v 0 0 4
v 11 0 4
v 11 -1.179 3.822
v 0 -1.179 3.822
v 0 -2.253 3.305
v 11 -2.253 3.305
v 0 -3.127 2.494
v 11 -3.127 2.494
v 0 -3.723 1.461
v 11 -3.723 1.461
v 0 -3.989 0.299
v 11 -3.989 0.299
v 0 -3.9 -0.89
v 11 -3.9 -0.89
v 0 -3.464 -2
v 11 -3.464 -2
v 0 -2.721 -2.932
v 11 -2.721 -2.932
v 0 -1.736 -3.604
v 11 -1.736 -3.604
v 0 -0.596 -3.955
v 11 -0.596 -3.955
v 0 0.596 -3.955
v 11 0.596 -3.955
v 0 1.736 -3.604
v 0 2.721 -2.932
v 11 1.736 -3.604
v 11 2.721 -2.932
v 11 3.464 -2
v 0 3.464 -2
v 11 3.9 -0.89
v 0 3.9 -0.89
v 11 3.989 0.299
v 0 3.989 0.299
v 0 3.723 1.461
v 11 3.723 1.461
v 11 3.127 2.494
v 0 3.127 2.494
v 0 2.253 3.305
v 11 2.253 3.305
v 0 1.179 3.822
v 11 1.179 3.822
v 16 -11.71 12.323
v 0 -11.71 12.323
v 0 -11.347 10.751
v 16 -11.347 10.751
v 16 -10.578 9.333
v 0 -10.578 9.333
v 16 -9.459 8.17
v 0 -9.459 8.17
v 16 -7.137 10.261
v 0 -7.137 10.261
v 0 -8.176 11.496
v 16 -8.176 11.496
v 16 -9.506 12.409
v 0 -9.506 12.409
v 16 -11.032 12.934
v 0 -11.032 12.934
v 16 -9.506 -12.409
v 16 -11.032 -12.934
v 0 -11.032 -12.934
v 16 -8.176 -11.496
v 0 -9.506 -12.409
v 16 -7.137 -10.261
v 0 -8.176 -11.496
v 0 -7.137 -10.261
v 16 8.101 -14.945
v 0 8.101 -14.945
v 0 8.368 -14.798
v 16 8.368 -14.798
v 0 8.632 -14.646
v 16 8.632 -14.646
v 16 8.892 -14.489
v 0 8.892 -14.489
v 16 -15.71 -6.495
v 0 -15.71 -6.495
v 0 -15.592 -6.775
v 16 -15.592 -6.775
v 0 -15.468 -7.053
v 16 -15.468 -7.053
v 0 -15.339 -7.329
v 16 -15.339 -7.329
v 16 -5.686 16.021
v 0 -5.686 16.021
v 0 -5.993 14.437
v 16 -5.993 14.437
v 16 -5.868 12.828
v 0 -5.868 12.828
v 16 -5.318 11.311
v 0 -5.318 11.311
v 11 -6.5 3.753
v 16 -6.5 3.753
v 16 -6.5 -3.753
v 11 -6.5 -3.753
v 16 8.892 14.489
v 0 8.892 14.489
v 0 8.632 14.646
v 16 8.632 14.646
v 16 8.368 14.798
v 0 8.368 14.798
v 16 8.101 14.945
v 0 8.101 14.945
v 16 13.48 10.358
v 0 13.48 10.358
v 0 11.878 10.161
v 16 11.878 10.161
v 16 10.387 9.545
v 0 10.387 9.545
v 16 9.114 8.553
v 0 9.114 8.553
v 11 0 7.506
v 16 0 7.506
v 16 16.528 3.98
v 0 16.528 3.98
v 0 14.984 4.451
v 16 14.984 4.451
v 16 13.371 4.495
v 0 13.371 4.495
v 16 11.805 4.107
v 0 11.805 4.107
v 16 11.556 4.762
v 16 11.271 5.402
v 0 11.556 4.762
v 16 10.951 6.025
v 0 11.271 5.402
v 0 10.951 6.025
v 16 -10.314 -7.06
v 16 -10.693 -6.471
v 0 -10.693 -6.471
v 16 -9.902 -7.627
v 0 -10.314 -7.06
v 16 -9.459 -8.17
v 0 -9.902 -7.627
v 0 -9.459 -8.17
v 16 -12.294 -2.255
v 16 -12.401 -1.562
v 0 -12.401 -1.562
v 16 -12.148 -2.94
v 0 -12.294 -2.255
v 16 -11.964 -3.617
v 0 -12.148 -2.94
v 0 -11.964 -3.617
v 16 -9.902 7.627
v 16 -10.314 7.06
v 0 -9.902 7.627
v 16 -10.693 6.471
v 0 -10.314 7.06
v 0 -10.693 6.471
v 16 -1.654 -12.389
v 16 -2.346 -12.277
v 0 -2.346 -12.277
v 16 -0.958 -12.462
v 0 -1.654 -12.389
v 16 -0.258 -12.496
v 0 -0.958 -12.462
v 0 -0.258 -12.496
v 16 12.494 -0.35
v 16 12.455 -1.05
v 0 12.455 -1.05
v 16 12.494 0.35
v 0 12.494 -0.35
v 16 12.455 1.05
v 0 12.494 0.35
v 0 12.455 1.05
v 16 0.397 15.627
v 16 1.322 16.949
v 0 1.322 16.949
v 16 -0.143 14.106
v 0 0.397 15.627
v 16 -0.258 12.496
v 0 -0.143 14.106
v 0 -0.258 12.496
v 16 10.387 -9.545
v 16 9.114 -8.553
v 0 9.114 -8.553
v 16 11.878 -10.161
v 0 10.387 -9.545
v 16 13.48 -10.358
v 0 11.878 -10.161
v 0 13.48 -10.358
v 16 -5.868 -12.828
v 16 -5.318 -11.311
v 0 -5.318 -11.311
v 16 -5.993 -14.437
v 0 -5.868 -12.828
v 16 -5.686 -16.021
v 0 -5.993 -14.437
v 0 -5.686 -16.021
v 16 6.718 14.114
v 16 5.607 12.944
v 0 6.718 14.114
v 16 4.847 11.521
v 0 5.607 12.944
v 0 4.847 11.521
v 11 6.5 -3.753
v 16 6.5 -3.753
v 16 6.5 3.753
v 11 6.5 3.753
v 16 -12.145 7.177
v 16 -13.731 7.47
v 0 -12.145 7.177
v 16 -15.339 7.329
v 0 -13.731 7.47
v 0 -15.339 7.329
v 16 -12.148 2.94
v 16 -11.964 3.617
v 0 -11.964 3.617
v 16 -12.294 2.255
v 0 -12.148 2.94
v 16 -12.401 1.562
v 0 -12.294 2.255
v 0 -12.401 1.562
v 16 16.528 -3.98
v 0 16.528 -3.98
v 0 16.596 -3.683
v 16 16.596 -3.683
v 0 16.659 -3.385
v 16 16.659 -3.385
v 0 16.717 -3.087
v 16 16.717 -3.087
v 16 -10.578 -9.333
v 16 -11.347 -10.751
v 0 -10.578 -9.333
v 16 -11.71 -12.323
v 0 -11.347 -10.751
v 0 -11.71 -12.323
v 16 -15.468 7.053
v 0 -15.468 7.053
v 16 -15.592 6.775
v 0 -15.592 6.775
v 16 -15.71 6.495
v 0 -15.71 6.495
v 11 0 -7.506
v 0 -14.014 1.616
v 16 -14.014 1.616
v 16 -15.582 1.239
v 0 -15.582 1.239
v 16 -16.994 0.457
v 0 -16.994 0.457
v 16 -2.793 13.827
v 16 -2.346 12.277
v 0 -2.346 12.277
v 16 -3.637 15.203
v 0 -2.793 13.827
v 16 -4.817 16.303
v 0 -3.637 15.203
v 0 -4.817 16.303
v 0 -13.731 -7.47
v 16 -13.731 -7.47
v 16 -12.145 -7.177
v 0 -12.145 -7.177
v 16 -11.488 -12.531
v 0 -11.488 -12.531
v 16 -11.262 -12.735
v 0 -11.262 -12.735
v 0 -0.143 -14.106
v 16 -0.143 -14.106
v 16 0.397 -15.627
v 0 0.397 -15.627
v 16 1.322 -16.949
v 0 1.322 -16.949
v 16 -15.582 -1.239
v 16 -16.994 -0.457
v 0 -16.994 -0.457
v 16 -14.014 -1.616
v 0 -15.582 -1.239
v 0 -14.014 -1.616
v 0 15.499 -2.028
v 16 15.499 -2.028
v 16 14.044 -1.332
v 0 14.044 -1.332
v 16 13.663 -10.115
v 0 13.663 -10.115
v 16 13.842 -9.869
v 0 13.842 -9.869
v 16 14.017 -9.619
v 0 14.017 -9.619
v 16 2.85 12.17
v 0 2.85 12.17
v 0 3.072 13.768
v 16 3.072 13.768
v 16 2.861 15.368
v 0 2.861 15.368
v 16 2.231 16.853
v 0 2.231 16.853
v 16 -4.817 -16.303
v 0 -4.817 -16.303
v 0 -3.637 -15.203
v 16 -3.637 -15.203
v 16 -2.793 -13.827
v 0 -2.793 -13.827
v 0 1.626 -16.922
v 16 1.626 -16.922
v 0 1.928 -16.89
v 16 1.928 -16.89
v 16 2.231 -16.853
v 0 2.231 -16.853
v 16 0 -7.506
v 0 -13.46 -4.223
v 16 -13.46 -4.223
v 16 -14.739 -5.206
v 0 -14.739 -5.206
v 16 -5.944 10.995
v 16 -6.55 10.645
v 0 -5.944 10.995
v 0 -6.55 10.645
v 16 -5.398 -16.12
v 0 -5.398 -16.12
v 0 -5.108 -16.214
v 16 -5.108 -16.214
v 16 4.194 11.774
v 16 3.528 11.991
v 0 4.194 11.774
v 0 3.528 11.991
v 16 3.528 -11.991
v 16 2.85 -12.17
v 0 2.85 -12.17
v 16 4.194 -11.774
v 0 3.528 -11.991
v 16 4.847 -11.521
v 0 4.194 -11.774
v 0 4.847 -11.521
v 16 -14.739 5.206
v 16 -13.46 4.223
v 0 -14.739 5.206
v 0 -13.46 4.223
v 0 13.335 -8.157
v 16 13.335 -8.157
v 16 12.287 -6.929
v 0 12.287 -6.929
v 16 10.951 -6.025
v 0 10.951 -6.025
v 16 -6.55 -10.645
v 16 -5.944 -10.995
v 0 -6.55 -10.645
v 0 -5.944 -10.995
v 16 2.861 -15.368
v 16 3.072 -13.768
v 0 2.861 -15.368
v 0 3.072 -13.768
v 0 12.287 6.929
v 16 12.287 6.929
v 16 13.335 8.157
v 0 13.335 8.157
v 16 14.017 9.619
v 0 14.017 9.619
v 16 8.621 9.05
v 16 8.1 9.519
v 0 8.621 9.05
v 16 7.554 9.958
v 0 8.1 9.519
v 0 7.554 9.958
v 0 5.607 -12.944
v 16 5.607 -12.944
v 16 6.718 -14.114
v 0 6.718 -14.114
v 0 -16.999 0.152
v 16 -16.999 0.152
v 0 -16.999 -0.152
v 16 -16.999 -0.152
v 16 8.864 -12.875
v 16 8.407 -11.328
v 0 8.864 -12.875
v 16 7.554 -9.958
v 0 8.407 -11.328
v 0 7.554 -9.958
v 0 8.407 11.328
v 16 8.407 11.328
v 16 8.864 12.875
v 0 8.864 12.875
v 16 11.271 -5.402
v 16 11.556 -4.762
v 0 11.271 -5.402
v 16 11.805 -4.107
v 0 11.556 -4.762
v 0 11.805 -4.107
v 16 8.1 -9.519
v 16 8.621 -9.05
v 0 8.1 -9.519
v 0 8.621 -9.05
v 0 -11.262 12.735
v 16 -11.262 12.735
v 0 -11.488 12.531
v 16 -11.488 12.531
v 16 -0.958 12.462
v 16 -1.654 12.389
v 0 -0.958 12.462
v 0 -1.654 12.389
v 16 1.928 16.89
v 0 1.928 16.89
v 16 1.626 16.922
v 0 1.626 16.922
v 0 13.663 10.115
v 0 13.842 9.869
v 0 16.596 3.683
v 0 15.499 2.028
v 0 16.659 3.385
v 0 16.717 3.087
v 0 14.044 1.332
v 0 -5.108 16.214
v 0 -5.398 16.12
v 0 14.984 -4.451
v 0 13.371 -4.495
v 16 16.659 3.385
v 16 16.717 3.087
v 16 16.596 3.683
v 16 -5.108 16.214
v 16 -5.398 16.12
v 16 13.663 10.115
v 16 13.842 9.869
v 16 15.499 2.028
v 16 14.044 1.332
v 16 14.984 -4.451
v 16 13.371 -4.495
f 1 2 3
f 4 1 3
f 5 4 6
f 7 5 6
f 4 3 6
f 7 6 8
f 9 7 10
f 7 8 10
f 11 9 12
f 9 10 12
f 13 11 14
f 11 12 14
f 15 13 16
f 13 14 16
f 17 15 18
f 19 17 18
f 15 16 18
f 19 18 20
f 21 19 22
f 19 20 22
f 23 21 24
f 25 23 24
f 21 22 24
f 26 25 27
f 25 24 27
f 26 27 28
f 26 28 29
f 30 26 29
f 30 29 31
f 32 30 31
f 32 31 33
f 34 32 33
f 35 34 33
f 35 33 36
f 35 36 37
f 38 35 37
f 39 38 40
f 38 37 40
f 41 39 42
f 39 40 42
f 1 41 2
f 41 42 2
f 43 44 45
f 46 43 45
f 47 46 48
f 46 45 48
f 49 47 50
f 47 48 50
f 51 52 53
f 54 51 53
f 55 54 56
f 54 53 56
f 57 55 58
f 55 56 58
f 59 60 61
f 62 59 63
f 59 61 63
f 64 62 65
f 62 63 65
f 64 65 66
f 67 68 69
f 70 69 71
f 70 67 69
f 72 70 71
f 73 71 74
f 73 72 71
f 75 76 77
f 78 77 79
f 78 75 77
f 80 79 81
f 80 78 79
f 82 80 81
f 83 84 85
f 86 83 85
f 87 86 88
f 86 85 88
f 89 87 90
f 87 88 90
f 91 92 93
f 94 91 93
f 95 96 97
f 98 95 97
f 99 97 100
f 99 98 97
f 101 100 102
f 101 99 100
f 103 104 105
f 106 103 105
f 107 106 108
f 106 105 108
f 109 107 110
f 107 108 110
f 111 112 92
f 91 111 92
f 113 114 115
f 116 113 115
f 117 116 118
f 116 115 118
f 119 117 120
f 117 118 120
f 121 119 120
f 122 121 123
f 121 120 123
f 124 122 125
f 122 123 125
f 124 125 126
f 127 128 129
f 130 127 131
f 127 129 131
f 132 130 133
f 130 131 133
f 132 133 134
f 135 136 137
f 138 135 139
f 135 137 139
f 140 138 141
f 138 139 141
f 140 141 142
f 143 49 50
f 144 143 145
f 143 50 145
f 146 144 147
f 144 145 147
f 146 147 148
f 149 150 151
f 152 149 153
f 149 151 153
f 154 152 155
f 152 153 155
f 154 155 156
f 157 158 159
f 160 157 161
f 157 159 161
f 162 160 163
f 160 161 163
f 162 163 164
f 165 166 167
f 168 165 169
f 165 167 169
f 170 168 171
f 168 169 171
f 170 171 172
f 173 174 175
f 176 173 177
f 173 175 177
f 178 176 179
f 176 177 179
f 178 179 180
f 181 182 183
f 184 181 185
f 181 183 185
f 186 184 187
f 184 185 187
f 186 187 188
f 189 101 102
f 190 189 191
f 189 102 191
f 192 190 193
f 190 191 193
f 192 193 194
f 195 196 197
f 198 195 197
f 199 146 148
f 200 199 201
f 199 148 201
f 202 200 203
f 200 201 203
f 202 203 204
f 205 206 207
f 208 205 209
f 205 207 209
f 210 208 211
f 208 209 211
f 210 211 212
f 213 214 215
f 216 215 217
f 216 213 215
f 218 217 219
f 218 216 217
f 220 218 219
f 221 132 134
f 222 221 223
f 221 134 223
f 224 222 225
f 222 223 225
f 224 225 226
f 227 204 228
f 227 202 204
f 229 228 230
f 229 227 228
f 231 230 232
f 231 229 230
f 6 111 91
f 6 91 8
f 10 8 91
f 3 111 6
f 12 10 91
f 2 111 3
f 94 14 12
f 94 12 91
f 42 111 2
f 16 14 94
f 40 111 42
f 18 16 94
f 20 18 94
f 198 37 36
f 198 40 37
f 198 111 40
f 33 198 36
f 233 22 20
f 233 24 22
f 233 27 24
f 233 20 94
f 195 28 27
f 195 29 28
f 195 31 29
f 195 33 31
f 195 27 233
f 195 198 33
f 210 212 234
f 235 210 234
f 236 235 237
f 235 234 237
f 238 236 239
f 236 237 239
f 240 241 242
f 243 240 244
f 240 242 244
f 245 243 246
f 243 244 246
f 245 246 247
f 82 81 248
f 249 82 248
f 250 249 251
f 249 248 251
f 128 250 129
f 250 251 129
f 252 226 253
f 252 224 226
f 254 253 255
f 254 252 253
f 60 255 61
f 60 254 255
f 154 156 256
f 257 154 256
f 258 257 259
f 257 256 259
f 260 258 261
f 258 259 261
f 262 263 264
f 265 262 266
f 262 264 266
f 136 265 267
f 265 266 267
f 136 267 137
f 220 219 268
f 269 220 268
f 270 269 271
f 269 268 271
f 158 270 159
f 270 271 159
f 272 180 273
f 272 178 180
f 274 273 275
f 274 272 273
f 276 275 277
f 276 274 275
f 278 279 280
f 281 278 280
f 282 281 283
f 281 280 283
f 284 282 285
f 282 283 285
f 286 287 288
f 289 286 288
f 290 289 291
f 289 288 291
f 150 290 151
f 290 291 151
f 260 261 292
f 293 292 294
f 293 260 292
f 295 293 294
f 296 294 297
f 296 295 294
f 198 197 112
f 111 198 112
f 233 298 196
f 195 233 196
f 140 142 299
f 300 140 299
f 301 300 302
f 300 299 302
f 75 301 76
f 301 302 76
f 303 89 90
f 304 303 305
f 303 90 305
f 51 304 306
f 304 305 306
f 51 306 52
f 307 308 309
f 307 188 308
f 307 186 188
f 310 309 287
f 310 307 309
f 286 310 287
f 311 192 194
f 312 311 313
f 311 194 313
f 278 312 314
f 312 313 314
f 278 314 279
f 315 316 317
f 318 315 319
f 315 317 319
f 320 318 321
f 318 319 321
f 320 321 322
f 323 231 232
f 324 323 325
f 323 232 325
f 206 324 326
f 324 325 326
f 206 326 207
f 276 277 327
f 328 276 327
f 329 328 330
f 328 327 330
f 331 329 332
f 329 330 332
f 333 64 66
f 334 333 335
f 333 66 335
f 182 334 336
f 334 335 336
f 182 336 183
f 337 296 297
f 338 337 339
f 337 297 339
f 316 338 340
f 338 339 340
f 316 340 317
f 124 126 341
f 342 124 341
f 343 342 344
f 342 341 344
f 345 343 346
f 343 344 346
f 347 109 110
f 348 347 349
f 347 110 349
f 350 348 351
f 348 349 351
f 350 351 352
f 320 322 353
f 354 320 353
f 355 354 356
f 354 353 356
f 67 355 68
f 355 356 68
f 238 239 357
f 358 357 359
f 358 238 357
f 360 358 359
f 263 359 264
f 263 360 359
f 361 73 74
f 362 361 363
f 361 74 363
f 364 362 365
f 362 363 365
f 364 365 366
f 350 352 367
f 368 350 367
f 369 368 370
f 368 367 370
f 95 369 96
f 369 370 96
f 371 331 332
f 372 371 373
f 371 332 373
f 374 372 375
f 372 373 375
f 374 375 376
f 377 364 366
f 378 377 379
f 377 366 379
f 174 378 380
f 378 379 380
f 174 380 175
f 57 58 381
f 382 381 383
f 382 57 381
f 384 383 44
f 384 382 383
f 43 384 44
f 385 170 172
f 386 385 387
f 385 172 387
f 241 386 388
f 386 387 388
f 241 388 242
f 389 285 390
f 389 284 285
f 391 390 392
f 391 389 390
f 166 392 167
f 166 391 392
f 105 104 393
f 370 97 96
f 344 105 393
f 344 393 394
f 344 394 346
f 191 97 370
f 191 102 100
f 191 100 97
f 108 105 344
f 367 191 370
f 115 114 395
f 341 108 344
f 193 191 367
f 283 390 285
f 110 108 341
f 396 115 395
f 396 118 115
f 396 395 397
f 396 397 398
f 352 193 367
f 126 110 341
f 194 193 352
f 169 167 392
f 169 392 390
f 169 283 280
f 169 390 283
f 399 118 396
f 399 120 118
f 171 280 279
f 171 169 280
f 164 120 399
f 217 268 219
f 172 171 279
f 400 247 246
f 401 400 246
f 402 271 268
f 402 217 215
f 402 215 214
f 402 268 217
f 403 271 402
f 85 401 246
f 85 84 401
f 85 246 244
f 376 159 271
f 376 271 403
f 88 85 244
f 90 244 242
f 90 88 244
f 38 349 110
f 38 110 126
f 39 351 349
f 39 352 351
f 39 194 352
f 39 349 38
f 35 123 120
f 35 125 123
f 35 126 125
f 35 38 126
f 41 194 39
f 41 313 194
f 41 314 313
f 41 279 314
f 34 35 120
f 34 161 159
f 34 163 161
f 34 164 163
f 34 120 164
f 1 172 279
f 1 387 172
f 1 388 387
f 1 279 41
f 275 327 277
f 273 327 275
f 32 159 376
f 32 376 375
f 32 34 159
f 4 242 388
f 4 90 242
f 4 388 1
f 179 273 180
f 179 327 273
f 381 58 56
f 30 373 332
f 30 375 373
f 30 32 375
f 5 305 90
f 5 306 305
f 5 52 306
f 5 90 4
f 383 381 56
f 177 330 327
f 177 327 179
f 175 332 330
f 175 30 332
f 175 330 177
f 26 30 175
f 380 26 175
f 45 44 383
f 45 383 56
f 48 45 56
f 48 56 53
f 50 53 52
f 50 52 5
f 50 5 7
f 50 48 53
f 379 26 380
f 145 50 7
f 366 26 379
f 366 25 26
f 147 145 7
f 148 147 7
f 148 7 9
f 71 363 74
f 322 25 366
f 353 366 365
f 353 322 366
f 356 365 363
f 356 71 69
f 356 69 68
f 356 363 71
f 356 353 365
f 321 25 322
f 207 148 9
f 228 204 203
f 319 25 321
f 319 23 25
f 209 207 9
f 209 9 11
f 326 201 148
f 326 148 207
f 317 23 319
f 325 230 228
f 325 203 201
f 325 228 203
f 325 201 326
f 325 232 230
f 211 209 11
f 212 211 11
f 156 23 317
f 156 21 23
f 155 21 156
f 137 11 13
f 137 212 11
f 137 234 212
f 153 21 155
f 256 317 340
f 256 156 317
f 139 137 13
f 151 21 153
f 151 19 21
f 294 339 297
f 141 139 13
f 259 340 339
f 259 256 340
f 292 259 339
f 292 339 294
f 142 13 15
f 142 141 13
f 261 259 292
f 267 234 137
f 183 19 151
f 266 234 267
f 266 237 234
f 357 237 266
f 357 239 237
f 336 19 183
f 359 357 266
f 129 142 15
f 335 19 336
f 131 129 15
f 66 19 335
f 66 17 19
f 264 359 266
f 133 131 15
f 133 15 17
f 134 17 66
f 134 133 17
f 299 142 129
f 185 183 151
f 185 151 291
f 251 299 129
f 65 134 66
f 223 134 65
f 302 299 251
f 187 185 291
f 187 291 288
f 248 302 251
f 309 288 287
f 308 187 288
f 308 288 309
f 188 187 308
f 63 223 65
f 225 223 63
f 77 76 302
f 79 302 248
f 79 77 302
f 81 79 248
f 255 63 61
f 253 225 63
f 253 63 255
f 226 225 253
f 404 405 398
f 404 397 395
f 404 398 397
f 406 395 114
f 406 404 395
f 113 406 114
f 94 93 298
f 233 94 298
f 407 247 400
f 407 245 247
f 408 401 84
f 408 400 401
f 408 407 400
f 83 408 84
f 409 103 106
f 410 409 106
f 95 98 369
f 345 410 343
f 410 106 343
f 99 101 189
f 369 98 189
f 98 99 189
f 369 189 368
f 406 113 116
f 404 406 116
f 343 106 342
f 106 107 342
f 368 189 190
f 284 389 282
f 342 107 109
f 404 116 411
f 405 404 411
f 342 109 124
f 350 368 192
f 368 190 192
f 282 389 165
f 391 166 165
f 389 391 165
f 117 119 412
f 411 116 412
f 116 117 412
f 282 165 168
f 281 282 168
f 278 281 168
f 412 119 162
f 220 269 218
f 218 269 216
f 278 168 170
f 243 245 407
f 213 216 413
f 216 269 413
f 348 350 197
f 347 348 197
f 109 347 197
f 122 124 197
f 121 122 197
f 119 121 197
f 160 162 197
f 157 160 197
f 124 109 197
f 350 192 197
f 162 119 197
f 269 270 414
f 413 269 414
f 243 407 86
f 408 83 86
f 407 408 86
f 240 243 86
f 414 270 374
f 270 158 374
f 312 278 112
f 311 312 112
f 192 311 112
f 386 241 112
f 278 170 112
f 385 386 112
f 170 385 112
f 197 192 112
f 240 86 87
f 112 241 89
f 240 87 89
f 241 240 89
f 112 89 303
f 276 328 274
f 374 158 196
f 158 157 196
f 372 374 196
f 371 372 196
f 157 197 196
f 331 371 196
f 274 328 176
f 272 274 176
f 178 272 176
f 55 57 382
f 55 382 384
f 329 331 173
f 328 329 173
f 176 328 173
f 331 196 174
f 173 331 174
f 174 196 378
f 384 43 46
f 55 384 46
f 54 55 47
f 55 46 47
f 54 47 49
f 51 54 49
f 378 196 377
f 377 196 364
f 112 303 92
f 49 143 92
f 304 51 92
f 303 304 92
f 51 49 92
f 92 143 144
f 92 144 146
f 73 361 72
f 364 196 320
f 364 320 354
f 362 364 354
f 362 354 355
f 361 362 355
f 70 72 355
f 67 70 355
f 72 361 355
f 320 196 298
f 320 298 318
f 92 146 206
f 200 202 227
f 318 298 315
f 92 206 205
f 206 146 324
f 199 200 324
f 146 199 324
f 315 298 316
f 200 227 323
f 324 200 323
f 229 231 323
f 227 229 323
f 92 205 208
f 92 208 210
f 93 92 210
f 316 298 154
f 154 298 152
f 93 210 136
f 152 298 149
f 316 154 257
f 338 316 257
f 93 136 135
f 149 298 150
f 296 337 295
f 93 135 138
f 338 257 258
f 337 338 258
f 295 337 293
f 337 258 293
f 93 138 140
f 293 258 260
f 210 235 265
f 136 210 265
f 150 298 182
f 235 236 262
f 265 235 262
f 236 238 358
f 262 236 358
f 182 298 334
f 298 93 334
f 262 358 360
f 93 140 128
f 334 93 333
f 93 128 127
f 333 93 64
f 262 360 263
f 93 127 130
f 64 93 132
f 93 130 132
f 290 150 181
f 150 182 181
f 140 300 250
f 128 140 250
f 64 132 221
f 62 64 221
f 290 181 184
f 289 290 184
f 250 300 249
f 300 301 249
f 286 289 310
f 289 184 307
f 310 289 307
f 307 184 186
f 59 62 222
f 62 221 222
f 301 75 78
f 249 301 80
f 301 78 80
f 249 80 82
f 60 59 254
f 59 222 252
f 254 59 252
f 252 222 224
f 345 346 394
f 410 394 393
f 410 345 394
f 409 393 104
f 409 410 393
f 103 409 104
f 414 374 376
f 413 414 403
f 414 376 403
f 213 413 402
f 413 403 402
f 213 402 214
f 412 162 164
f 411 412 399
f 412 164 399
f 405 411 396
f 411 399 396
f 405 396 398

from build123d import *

# Parameters (mm, degrees)
BASPROSKE_W        = 16
BASPROSKE_H        = 17
TOOTHCUT_DEPTH     = 29.879058156
TEETHCUTS_COUNT    = 15
TEETHCUTS_ANGLE    = 336
BORSKE_R           = 4
BORE_DEPTH         = 50.0000508
CUT_EXTRUDE1_DEPTH = 5


with BuildPart() as part:
    # BasProSke → Base-Revolve (revolve)
    with BuildSketch(Plane(origin=(0, 0, 0), x_dir=(1, 0, 0), z_dir=(0, 1, 0)), mode=Mode.PRIVATE) as base_revolve_sk:
        with Locations((8, 8.5)):
            Rectangle(BASPROSKE_W, BASPROSKE_H)
    revolve(base_revolve_sk.sketch.rotate(Axis((-10, 0, 0), (1, 0, 0)), 180), axis=Axis((-10, 0, 0), (1, 0, 0)))

    # TooCutSke → ToothCut (cut, through all)
    with BuildSketch(Plane(origin=(0, 0, 0), x_dir=(0, 0, -1), z_dir=(1, 0, 0))):
        with BuildLine():
            ThreePointArc((1.050056448, 12.454813626), (0, 12.499), (-1.050056448, 12.454813626))
            ThreePointArc((-1.050056448, 12.454813626), (-1.638118106, 14.809604533), (-3.110934279, 16.73876737))
            ThreePointArc((-3.110934279, 16.73876737), (0, 17.0254), (3.110934279, 16.73876737))
            ThreePointArc((3.110934279, 16.73876737), (1.638118106, 14.809604533), (1.050056448, 12.454813626))
        make_face()
    toothcut = extrude(amount=TOOTHCUT_DEPTH, mode=Mode.SUBTRACT)

    # TeethCuts: ToothCut ×15 about axis
    teethcuts_axis = Axis((-10, 0, 0), (1, 0, 0))
    for i in range(1, TEETHCUTS_COUNT):
        add(toothcut.rotate(teethcuts_axis, i * TEETHCUTS_ANGLE / (TEETHCUTS_COUNT - 1)), mode=Mode.SUBTRACT)

    # BorSke → Bore (cut, symmetric)
    with BuildSketch(Plane(origin=(0, 0, 0), x_dir=(0, 0, -1), z_dir=(1, 0, 0))):
        with Locations(Location((0, 0, 0), (0, 0, 180))):
            Circle(BORSKE_R)
    extrude(amount=BORE_DEPTH, both=True, mode=Mode.SUBTRACT)

    # Sketch1 → Cut-Extrude1 (cut)
    with BuildSketch(Plane(origin=(16, 0, 0), x_dir=(0, 0, -1), z_dir=(1, 0, 0))):
        Polygon((-3.75277675, 6.5), (-7.505553499, 0), (-3.75277675, -6.5), (3.75277675, -6.5), (7.505553499, 0), (3.75277675, 6.5), align=None)
    extrude(amount=-CUT_EXTRUDE1_DEPTH, mode=Mode.SUBTRACT)


solid = part.part
